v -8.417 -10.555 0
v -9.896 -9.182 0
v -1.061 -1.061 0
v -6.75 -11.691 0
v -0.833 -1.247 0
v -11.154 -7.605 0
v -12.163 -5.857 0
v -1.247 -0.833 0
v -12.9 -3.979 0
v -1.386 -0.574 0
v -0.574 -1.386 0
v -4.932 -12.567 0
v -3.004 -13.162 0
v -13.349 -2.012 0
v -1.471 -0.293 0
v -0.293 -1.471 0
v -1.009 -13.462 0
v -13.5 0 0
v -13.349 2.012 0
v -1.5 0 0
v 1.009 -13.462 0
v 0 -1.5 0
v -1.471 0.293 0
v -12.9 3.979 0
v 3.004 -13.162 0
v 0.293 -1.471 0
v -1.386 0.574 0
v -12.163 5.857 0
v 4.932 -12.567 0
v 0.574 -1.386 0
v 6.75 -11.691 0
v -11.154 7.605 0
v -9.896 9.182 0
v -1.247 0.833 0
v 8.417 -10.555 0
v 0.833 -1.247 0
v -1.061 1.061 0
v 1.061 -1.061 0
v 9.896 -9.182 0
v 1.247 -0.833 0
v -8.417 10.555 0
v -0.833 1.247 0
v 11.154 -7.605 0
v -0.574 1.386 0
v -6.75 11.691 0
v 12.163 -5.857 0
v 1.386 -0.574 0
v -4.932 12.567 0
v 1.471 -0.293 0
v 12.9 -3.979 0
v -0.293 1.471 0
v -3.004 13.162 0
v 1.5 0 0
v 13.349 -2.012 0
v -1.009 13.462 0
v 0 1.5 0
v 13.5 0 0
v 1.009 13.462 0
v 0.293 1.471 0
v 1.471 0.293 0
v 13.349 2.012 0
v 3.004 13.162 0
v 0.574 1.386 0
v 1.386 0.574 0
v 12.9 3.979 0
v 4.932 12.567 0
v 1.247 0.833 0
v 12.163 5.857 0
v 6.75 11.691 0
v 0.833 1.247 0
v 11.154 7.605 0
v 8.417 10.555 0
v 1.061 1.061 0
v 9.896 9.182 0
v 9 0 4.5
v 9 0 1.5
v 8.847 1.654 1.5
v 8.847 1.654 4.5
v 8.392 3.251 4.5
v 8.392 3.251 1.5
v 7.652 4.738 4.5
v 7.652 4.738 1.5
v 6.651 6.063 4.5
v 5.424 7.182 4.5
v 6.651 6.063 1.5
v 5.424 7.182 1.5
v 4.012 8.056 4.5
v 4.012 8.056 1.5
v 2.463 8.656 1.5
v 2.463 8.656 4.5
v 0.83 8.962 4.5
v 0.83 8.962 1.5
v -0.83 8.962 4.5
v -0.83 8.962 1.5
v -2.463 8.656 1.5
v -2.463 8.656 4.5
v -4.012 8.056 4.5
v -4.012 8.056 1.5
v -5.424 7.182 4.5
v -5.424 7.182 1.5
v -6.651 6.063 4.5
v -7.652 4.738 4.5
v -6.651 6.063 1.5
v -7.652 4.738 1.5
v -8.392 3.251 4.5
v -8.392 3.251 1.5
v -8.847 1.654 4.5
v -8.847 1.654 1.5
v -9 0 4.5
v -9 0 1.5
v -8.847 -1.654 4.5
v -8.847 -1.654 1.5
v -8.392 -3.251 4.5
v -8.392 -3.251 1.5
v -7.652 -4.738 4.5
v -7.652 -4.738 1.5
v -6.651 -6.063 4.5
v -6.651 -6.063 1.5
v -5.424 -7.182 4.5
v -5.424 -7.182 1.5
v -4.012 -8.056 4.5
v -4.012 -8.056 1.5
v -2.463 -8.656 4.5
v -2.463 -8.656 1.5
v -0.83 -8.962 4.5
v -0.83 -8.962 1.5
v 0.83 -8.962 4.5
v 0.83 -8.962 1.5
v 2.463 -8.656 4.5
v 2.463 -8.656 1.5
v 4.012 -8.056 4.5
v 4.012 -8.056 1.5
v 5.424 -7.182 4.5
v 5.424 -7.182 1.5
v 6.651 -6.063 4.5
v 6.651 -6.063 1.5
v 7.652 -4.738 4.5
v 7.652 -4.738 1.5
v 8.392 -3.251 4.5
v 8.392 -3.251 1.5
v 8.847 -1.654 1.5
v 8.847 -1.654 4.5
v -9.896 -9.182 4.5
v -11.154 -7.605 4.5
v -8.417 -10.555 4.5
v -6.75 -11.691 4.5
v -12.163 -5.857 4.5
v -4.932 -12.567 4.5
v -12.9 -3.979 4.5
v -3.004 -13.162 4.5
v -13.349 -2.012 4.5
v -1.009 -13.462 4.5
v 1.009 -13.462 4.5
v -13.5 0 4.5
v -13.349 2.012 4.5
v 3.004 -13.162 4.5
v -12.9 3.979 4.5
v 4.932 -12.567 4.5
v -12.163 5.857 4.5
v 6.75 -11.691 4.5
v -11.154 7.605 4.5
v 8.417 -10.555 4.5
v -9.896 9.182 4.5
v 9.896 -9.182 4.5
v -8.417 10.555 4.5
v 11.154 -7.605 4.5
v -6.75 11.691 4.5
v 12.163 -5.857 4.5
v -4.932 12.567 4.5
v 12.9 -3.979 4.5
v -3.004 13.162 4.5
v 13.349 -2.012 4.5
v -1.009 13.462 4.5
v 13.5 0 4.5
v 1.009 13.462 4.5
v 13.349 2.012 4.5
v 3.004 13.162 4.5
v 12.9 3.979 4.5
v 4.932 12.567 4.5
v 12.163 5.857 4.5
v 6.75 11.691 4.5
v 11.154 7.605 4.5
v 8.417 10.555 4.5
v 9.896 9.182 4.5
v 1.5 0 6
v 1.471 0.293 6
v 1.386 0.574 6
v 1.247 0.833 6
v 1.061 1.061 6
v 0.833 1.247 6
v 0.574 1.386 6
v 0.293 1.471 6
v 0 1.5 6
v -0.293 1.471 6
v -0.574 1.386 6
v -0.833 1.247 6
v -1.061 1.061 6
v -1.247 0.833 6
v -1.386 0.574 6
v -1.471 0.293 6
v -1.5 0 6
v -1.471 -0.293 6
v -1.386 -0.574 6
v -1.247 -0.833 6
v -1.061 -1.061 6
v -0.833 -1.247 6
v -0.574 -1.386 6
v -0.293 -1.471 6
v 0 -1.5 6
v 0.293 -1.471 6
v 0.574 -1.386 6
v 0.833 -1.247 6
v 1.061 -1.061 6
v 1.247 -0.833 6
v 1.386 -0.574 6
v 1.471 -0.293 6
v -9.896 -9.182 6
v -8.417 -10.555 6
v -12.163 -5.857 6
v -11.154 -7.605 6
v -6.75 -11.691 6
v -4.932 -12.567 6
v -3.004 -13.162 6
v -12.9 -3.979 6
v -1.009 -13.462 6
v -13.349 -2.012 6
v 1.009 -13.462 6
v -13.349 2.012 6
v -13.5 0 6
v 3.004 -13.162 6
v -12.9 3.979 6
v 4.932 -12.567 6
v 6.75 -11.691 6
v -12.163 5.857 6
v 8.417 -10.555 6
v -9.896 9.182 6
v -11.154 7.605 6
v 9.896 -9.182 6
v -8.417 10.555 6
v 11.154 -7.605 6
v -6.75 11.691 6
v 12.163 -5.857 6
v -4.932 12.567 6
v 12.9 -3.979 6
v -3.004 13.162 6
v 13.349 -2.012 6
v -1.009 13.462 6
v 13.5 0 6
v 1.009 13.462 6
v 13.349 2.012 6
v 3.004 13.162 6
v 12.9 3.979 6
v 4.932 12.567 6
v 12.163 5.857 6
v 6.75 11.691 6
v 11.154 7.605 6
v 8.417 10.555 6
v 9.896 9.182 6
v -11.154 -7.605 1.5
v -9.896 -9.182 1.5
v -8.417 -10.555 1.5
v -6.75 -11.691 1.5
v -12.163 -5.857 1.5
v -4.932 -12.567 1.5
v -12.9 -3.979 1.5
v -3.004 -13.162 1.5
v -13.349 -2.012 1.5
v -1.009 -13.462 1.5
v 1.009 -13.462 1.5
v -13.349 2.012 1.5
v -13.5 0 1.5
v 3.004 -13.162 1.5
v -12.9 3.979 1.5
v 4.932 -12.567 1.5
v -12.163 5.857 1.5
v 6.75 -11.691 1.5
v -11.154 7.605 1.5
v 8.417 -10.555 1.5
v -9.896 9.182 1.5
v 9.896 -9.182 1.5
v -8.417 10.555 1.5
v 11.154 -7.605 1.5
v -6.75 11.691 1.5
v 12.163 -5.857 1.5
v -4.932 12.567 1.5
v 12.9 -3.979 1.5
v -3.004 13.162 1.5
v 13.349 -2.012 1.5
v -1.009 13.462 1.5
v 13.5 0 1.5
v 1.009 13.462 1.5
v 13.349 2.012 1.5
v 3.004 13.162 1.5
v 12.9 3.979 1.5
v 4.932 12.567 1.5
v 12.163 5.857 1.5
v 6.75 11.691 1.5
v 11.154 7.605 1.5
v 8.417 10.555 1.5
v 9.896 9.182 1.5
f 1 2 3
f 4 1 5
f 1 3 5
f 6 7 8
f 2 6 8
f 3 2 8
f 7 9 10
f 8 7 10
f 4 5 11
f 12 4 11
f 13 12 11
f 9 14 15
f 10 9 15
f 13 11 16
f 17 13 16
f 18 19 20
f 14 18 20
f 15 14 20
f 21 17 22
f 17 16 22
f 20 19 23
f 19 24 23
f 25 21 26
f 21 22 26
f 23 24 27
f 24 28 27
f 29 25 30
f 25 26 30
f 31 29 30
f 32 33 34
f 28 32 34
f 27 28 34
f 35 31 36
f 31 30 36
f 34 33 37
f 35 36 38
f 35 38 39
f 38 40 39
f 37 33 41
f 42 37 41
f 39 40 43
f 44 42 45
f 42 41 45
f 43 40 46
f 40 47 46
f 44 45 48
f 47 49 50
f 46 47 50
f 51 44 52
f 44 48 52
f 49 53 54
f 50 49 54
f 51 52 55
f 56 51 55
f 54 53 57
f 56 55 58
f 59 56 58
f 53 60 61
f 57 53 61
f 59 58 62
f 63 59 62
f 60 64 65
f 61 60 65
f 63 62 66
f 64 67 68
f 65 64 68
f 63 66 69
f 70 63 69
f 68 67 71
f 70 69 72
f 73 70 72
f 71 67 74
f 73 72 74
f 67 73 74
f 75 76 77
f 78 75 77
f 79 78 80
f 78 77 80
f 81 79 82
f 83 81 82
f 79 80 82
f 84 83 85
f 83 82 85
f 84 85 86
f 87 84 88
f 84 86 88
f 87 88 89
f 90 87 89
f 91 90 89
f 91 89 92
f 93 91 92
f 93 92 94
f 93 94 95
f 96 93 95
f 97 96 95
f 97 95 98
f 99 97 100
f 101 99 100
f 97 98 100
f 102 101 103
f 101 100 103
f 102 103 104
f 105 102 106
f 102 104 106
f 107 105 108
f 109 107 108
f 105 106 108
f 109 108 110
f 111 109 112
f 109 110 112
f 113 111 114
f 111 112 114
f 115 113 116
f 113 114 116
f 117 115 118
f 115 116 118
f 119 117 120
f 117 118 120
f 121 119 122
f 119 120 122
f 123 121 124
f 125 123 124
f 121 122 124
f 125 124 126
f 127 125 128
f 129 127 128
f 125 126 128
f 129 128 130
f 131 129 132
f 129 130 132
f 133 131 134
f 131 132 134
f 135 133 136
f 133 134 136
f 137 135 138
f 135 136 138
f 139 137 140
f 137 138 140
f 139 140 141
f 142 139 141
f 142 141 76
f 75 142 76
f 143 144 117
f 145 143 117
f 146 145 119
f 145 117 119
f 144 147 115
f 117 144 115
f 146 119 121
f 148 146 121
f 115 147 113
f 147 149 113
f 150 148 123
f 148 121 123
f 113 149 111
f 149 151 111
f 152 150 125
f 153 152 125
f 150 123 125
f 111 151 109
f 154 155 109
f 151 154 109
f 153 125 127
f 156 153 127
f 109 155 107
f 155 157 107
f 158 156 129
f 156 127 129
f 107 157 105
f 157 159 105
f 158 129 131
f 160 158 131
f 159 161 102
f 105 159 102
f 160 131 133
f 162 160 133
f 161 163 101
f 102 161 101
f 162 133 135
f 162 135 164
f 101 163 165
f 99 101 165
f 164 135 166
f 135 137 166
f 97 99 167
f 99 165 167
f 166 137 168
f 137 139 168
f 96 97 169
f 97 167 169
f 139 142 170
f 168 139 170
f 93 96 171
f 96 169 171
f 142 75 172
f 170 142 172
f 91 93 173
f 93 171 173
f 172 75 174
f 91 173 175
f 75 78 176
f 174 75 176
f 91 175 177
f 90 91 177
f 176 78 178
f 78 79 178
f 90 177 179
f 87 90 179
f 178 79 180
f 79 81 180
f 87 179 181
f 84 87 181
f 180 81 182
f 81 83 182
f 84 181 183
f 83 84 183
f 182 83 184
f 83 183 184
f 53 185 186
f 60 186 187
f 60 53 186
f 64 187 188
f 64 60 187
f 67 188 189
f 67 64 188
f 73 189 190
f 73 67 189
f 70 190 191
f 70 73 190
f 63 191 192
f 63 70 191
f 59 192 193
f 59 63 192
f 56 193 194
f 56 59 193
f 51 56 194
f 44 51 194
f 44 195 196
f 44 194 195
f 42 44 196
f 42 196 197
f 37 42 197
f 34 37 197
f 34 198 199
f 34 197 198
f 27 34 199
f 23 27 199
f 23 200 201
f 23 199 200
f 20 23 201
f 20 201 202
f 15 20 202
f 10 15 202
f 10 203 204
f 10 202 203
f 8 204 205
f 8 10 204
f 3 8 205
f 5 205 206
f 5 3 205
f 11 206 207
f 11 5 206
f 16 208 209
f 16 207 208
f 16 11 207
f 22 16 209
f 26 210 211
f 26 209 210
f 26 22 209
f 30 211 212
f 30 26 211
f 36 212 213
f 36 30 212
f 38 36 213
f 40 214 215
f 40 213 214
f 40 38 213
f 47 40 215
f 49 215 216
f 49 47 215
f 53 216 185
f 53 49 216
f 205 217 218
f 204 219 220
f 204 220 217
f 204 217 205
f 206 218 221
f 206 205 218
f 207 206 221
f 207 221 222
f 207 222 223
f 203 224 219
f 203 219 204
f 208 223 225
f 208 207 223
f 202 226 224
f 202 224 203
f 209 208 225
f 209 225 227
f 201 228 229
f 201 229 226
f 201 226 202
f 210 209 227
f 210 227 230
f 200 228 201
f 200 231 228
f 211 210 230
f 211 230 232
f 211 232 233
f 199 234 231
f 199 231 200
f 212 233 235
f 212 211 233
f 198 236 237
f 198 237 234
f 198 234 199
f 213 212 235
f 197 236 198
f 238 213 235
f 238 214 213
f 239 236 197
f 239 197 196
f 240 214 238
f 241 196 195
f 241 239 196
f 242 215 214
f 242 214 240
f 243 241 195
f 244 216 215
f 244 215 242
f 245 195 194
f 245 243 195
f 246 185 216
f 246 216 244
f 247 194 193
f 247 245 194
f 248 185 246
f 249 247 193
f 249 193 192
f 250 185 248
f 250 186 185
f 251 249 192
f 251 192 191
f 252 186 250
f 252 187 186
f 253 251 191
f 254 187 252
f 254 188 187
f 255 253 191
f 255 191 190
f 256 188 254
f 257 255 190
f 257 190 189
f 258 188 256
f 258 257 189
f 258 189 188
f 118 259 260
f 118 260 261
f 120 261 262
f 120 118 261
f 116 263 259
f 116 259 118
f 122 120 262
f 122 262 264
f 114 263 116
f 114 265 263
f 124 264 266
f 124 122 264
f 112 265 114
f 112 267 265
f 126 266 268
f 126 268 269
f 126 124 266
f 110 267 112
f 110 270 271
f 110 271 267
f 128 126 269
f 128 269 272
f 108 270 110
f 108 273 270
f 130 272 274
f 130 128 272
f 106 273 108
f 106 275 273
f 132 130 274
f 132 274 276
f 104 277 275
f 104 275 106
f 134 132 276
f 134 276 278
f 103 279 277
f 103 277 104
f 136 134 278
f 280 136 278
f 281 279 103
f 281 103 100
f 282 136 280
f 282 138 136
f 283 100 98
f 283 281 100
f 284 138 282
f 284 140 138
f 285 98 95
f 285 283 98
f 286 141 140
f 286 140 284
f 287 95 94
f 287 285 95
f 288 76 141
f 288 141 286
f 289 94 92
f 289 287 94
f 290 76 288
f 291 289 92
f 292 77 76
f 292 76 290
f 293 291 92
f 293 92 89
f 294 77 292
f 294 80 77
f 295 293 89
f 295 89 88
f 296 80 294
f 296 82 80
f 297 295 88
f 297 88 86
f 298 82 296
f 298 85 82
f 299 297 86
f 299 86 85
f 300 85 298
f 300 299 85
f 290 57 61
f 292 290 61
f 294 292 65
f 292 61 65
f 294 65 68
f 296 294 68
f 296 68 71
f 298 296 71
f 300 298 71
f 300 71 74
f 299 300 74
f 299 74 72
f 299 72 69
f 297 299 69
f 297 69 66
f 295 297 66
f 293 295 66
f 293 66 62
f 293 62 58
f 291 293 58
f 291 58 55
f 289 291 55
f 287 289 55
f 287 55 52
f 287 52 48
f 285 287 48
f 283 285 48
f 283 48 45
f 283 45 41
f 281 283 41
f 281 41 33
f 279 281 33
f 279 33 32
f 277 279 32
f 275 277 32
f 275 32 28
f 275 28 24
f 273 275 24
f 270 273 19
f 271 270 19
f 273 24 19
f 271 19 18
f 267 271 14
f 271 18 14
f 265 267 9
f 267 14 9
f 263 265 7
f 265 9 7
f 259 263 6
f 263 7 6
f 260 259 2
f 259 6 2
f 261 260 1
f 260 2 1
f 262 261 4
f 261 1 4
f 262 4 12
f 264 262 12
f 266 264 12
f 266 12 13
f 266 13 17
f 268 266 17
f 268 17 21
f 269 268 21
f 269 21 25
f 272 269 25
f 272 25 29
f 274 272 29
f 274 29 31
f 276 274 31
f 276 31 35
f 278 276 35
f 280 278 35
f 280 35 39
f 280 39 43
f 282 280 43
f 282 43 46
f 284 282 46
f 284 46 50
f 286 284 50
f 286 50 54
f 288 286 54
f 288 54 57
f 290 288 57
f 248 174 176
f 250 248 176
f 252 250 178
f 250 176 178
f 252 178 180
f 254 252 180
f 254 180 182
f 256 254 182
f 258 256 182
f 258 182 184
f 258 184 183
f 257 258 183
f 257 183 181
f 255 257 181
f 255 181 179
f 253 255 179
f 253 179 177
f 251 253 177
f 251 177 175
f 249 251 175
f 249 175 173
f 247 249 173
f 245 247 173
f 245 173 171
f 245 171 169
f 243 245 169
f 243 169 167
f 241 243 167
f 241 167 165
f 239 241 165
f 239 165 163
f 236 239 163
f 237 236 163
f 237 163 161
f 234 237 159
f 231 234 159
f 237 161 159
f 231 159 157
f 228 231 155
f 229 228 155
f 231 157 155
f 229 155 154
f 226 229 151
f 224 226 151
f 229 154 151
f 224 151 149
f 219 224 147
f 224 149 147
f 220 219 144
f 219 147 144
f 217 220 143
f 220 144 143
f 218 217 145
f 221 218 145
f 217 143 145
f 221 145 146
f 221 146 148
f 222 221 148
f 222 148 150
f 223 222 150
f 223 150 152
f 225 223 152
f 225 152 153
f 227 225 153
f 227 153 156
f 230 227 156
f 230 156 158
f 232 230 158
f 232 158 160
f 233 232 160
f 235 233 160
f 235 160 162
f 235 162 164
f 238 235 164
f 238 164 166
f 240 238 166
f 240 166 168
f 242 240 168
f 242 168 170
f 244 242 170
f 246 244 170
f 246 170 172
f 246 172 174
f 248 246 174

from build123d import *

# Parameters (mm, degrees)
SKETCH_1_R          = 13.5
EXTRUDE_1_DEPTH     = 6
SKETCH_3_R          = 1.5
CUT_EXTRUDE_2_DEPTH = 21.012496096
CUT_EXTRUDE_START   = -3
SKETCH_4_R          = 13.5
SKETCH_4_R_2        = 9
CUT_EXTRUDE_3_DEPTH = 3


with BuildPart() as part:
    # 草图1 → 凸台-拉伸1 (new body)
    with BuildSketch(Plane.XY):
        Circle(SKETCH_1_R)
    extrude(amount=EXTRUDE_1_DEPTH)

    # 草图3 → 切除-拉伸2 (cut, through all)
    with BuildSketch(Plane.XY):
        Circle(SKETCH_3_R)
    extrude(amount=CUT_EXTRUDE_2_DEPTH, mode=Mode.SUBTRACT)

    # 草图4 → 切除-拉伸3 (cut)
    with BuildSketch(Plane.XY.offset(4.5).offset(CUT_EXTRUDE_START)):
        Circle(SKETCH_4_R)
        Circle(SKETCH_4_R_2, mode=Mode.SUBTRACT)
    extrude(amount=CUT_EXTRUDE_3_DEPTH, mode=Mode.SUBTRACT)


solid = part.part
